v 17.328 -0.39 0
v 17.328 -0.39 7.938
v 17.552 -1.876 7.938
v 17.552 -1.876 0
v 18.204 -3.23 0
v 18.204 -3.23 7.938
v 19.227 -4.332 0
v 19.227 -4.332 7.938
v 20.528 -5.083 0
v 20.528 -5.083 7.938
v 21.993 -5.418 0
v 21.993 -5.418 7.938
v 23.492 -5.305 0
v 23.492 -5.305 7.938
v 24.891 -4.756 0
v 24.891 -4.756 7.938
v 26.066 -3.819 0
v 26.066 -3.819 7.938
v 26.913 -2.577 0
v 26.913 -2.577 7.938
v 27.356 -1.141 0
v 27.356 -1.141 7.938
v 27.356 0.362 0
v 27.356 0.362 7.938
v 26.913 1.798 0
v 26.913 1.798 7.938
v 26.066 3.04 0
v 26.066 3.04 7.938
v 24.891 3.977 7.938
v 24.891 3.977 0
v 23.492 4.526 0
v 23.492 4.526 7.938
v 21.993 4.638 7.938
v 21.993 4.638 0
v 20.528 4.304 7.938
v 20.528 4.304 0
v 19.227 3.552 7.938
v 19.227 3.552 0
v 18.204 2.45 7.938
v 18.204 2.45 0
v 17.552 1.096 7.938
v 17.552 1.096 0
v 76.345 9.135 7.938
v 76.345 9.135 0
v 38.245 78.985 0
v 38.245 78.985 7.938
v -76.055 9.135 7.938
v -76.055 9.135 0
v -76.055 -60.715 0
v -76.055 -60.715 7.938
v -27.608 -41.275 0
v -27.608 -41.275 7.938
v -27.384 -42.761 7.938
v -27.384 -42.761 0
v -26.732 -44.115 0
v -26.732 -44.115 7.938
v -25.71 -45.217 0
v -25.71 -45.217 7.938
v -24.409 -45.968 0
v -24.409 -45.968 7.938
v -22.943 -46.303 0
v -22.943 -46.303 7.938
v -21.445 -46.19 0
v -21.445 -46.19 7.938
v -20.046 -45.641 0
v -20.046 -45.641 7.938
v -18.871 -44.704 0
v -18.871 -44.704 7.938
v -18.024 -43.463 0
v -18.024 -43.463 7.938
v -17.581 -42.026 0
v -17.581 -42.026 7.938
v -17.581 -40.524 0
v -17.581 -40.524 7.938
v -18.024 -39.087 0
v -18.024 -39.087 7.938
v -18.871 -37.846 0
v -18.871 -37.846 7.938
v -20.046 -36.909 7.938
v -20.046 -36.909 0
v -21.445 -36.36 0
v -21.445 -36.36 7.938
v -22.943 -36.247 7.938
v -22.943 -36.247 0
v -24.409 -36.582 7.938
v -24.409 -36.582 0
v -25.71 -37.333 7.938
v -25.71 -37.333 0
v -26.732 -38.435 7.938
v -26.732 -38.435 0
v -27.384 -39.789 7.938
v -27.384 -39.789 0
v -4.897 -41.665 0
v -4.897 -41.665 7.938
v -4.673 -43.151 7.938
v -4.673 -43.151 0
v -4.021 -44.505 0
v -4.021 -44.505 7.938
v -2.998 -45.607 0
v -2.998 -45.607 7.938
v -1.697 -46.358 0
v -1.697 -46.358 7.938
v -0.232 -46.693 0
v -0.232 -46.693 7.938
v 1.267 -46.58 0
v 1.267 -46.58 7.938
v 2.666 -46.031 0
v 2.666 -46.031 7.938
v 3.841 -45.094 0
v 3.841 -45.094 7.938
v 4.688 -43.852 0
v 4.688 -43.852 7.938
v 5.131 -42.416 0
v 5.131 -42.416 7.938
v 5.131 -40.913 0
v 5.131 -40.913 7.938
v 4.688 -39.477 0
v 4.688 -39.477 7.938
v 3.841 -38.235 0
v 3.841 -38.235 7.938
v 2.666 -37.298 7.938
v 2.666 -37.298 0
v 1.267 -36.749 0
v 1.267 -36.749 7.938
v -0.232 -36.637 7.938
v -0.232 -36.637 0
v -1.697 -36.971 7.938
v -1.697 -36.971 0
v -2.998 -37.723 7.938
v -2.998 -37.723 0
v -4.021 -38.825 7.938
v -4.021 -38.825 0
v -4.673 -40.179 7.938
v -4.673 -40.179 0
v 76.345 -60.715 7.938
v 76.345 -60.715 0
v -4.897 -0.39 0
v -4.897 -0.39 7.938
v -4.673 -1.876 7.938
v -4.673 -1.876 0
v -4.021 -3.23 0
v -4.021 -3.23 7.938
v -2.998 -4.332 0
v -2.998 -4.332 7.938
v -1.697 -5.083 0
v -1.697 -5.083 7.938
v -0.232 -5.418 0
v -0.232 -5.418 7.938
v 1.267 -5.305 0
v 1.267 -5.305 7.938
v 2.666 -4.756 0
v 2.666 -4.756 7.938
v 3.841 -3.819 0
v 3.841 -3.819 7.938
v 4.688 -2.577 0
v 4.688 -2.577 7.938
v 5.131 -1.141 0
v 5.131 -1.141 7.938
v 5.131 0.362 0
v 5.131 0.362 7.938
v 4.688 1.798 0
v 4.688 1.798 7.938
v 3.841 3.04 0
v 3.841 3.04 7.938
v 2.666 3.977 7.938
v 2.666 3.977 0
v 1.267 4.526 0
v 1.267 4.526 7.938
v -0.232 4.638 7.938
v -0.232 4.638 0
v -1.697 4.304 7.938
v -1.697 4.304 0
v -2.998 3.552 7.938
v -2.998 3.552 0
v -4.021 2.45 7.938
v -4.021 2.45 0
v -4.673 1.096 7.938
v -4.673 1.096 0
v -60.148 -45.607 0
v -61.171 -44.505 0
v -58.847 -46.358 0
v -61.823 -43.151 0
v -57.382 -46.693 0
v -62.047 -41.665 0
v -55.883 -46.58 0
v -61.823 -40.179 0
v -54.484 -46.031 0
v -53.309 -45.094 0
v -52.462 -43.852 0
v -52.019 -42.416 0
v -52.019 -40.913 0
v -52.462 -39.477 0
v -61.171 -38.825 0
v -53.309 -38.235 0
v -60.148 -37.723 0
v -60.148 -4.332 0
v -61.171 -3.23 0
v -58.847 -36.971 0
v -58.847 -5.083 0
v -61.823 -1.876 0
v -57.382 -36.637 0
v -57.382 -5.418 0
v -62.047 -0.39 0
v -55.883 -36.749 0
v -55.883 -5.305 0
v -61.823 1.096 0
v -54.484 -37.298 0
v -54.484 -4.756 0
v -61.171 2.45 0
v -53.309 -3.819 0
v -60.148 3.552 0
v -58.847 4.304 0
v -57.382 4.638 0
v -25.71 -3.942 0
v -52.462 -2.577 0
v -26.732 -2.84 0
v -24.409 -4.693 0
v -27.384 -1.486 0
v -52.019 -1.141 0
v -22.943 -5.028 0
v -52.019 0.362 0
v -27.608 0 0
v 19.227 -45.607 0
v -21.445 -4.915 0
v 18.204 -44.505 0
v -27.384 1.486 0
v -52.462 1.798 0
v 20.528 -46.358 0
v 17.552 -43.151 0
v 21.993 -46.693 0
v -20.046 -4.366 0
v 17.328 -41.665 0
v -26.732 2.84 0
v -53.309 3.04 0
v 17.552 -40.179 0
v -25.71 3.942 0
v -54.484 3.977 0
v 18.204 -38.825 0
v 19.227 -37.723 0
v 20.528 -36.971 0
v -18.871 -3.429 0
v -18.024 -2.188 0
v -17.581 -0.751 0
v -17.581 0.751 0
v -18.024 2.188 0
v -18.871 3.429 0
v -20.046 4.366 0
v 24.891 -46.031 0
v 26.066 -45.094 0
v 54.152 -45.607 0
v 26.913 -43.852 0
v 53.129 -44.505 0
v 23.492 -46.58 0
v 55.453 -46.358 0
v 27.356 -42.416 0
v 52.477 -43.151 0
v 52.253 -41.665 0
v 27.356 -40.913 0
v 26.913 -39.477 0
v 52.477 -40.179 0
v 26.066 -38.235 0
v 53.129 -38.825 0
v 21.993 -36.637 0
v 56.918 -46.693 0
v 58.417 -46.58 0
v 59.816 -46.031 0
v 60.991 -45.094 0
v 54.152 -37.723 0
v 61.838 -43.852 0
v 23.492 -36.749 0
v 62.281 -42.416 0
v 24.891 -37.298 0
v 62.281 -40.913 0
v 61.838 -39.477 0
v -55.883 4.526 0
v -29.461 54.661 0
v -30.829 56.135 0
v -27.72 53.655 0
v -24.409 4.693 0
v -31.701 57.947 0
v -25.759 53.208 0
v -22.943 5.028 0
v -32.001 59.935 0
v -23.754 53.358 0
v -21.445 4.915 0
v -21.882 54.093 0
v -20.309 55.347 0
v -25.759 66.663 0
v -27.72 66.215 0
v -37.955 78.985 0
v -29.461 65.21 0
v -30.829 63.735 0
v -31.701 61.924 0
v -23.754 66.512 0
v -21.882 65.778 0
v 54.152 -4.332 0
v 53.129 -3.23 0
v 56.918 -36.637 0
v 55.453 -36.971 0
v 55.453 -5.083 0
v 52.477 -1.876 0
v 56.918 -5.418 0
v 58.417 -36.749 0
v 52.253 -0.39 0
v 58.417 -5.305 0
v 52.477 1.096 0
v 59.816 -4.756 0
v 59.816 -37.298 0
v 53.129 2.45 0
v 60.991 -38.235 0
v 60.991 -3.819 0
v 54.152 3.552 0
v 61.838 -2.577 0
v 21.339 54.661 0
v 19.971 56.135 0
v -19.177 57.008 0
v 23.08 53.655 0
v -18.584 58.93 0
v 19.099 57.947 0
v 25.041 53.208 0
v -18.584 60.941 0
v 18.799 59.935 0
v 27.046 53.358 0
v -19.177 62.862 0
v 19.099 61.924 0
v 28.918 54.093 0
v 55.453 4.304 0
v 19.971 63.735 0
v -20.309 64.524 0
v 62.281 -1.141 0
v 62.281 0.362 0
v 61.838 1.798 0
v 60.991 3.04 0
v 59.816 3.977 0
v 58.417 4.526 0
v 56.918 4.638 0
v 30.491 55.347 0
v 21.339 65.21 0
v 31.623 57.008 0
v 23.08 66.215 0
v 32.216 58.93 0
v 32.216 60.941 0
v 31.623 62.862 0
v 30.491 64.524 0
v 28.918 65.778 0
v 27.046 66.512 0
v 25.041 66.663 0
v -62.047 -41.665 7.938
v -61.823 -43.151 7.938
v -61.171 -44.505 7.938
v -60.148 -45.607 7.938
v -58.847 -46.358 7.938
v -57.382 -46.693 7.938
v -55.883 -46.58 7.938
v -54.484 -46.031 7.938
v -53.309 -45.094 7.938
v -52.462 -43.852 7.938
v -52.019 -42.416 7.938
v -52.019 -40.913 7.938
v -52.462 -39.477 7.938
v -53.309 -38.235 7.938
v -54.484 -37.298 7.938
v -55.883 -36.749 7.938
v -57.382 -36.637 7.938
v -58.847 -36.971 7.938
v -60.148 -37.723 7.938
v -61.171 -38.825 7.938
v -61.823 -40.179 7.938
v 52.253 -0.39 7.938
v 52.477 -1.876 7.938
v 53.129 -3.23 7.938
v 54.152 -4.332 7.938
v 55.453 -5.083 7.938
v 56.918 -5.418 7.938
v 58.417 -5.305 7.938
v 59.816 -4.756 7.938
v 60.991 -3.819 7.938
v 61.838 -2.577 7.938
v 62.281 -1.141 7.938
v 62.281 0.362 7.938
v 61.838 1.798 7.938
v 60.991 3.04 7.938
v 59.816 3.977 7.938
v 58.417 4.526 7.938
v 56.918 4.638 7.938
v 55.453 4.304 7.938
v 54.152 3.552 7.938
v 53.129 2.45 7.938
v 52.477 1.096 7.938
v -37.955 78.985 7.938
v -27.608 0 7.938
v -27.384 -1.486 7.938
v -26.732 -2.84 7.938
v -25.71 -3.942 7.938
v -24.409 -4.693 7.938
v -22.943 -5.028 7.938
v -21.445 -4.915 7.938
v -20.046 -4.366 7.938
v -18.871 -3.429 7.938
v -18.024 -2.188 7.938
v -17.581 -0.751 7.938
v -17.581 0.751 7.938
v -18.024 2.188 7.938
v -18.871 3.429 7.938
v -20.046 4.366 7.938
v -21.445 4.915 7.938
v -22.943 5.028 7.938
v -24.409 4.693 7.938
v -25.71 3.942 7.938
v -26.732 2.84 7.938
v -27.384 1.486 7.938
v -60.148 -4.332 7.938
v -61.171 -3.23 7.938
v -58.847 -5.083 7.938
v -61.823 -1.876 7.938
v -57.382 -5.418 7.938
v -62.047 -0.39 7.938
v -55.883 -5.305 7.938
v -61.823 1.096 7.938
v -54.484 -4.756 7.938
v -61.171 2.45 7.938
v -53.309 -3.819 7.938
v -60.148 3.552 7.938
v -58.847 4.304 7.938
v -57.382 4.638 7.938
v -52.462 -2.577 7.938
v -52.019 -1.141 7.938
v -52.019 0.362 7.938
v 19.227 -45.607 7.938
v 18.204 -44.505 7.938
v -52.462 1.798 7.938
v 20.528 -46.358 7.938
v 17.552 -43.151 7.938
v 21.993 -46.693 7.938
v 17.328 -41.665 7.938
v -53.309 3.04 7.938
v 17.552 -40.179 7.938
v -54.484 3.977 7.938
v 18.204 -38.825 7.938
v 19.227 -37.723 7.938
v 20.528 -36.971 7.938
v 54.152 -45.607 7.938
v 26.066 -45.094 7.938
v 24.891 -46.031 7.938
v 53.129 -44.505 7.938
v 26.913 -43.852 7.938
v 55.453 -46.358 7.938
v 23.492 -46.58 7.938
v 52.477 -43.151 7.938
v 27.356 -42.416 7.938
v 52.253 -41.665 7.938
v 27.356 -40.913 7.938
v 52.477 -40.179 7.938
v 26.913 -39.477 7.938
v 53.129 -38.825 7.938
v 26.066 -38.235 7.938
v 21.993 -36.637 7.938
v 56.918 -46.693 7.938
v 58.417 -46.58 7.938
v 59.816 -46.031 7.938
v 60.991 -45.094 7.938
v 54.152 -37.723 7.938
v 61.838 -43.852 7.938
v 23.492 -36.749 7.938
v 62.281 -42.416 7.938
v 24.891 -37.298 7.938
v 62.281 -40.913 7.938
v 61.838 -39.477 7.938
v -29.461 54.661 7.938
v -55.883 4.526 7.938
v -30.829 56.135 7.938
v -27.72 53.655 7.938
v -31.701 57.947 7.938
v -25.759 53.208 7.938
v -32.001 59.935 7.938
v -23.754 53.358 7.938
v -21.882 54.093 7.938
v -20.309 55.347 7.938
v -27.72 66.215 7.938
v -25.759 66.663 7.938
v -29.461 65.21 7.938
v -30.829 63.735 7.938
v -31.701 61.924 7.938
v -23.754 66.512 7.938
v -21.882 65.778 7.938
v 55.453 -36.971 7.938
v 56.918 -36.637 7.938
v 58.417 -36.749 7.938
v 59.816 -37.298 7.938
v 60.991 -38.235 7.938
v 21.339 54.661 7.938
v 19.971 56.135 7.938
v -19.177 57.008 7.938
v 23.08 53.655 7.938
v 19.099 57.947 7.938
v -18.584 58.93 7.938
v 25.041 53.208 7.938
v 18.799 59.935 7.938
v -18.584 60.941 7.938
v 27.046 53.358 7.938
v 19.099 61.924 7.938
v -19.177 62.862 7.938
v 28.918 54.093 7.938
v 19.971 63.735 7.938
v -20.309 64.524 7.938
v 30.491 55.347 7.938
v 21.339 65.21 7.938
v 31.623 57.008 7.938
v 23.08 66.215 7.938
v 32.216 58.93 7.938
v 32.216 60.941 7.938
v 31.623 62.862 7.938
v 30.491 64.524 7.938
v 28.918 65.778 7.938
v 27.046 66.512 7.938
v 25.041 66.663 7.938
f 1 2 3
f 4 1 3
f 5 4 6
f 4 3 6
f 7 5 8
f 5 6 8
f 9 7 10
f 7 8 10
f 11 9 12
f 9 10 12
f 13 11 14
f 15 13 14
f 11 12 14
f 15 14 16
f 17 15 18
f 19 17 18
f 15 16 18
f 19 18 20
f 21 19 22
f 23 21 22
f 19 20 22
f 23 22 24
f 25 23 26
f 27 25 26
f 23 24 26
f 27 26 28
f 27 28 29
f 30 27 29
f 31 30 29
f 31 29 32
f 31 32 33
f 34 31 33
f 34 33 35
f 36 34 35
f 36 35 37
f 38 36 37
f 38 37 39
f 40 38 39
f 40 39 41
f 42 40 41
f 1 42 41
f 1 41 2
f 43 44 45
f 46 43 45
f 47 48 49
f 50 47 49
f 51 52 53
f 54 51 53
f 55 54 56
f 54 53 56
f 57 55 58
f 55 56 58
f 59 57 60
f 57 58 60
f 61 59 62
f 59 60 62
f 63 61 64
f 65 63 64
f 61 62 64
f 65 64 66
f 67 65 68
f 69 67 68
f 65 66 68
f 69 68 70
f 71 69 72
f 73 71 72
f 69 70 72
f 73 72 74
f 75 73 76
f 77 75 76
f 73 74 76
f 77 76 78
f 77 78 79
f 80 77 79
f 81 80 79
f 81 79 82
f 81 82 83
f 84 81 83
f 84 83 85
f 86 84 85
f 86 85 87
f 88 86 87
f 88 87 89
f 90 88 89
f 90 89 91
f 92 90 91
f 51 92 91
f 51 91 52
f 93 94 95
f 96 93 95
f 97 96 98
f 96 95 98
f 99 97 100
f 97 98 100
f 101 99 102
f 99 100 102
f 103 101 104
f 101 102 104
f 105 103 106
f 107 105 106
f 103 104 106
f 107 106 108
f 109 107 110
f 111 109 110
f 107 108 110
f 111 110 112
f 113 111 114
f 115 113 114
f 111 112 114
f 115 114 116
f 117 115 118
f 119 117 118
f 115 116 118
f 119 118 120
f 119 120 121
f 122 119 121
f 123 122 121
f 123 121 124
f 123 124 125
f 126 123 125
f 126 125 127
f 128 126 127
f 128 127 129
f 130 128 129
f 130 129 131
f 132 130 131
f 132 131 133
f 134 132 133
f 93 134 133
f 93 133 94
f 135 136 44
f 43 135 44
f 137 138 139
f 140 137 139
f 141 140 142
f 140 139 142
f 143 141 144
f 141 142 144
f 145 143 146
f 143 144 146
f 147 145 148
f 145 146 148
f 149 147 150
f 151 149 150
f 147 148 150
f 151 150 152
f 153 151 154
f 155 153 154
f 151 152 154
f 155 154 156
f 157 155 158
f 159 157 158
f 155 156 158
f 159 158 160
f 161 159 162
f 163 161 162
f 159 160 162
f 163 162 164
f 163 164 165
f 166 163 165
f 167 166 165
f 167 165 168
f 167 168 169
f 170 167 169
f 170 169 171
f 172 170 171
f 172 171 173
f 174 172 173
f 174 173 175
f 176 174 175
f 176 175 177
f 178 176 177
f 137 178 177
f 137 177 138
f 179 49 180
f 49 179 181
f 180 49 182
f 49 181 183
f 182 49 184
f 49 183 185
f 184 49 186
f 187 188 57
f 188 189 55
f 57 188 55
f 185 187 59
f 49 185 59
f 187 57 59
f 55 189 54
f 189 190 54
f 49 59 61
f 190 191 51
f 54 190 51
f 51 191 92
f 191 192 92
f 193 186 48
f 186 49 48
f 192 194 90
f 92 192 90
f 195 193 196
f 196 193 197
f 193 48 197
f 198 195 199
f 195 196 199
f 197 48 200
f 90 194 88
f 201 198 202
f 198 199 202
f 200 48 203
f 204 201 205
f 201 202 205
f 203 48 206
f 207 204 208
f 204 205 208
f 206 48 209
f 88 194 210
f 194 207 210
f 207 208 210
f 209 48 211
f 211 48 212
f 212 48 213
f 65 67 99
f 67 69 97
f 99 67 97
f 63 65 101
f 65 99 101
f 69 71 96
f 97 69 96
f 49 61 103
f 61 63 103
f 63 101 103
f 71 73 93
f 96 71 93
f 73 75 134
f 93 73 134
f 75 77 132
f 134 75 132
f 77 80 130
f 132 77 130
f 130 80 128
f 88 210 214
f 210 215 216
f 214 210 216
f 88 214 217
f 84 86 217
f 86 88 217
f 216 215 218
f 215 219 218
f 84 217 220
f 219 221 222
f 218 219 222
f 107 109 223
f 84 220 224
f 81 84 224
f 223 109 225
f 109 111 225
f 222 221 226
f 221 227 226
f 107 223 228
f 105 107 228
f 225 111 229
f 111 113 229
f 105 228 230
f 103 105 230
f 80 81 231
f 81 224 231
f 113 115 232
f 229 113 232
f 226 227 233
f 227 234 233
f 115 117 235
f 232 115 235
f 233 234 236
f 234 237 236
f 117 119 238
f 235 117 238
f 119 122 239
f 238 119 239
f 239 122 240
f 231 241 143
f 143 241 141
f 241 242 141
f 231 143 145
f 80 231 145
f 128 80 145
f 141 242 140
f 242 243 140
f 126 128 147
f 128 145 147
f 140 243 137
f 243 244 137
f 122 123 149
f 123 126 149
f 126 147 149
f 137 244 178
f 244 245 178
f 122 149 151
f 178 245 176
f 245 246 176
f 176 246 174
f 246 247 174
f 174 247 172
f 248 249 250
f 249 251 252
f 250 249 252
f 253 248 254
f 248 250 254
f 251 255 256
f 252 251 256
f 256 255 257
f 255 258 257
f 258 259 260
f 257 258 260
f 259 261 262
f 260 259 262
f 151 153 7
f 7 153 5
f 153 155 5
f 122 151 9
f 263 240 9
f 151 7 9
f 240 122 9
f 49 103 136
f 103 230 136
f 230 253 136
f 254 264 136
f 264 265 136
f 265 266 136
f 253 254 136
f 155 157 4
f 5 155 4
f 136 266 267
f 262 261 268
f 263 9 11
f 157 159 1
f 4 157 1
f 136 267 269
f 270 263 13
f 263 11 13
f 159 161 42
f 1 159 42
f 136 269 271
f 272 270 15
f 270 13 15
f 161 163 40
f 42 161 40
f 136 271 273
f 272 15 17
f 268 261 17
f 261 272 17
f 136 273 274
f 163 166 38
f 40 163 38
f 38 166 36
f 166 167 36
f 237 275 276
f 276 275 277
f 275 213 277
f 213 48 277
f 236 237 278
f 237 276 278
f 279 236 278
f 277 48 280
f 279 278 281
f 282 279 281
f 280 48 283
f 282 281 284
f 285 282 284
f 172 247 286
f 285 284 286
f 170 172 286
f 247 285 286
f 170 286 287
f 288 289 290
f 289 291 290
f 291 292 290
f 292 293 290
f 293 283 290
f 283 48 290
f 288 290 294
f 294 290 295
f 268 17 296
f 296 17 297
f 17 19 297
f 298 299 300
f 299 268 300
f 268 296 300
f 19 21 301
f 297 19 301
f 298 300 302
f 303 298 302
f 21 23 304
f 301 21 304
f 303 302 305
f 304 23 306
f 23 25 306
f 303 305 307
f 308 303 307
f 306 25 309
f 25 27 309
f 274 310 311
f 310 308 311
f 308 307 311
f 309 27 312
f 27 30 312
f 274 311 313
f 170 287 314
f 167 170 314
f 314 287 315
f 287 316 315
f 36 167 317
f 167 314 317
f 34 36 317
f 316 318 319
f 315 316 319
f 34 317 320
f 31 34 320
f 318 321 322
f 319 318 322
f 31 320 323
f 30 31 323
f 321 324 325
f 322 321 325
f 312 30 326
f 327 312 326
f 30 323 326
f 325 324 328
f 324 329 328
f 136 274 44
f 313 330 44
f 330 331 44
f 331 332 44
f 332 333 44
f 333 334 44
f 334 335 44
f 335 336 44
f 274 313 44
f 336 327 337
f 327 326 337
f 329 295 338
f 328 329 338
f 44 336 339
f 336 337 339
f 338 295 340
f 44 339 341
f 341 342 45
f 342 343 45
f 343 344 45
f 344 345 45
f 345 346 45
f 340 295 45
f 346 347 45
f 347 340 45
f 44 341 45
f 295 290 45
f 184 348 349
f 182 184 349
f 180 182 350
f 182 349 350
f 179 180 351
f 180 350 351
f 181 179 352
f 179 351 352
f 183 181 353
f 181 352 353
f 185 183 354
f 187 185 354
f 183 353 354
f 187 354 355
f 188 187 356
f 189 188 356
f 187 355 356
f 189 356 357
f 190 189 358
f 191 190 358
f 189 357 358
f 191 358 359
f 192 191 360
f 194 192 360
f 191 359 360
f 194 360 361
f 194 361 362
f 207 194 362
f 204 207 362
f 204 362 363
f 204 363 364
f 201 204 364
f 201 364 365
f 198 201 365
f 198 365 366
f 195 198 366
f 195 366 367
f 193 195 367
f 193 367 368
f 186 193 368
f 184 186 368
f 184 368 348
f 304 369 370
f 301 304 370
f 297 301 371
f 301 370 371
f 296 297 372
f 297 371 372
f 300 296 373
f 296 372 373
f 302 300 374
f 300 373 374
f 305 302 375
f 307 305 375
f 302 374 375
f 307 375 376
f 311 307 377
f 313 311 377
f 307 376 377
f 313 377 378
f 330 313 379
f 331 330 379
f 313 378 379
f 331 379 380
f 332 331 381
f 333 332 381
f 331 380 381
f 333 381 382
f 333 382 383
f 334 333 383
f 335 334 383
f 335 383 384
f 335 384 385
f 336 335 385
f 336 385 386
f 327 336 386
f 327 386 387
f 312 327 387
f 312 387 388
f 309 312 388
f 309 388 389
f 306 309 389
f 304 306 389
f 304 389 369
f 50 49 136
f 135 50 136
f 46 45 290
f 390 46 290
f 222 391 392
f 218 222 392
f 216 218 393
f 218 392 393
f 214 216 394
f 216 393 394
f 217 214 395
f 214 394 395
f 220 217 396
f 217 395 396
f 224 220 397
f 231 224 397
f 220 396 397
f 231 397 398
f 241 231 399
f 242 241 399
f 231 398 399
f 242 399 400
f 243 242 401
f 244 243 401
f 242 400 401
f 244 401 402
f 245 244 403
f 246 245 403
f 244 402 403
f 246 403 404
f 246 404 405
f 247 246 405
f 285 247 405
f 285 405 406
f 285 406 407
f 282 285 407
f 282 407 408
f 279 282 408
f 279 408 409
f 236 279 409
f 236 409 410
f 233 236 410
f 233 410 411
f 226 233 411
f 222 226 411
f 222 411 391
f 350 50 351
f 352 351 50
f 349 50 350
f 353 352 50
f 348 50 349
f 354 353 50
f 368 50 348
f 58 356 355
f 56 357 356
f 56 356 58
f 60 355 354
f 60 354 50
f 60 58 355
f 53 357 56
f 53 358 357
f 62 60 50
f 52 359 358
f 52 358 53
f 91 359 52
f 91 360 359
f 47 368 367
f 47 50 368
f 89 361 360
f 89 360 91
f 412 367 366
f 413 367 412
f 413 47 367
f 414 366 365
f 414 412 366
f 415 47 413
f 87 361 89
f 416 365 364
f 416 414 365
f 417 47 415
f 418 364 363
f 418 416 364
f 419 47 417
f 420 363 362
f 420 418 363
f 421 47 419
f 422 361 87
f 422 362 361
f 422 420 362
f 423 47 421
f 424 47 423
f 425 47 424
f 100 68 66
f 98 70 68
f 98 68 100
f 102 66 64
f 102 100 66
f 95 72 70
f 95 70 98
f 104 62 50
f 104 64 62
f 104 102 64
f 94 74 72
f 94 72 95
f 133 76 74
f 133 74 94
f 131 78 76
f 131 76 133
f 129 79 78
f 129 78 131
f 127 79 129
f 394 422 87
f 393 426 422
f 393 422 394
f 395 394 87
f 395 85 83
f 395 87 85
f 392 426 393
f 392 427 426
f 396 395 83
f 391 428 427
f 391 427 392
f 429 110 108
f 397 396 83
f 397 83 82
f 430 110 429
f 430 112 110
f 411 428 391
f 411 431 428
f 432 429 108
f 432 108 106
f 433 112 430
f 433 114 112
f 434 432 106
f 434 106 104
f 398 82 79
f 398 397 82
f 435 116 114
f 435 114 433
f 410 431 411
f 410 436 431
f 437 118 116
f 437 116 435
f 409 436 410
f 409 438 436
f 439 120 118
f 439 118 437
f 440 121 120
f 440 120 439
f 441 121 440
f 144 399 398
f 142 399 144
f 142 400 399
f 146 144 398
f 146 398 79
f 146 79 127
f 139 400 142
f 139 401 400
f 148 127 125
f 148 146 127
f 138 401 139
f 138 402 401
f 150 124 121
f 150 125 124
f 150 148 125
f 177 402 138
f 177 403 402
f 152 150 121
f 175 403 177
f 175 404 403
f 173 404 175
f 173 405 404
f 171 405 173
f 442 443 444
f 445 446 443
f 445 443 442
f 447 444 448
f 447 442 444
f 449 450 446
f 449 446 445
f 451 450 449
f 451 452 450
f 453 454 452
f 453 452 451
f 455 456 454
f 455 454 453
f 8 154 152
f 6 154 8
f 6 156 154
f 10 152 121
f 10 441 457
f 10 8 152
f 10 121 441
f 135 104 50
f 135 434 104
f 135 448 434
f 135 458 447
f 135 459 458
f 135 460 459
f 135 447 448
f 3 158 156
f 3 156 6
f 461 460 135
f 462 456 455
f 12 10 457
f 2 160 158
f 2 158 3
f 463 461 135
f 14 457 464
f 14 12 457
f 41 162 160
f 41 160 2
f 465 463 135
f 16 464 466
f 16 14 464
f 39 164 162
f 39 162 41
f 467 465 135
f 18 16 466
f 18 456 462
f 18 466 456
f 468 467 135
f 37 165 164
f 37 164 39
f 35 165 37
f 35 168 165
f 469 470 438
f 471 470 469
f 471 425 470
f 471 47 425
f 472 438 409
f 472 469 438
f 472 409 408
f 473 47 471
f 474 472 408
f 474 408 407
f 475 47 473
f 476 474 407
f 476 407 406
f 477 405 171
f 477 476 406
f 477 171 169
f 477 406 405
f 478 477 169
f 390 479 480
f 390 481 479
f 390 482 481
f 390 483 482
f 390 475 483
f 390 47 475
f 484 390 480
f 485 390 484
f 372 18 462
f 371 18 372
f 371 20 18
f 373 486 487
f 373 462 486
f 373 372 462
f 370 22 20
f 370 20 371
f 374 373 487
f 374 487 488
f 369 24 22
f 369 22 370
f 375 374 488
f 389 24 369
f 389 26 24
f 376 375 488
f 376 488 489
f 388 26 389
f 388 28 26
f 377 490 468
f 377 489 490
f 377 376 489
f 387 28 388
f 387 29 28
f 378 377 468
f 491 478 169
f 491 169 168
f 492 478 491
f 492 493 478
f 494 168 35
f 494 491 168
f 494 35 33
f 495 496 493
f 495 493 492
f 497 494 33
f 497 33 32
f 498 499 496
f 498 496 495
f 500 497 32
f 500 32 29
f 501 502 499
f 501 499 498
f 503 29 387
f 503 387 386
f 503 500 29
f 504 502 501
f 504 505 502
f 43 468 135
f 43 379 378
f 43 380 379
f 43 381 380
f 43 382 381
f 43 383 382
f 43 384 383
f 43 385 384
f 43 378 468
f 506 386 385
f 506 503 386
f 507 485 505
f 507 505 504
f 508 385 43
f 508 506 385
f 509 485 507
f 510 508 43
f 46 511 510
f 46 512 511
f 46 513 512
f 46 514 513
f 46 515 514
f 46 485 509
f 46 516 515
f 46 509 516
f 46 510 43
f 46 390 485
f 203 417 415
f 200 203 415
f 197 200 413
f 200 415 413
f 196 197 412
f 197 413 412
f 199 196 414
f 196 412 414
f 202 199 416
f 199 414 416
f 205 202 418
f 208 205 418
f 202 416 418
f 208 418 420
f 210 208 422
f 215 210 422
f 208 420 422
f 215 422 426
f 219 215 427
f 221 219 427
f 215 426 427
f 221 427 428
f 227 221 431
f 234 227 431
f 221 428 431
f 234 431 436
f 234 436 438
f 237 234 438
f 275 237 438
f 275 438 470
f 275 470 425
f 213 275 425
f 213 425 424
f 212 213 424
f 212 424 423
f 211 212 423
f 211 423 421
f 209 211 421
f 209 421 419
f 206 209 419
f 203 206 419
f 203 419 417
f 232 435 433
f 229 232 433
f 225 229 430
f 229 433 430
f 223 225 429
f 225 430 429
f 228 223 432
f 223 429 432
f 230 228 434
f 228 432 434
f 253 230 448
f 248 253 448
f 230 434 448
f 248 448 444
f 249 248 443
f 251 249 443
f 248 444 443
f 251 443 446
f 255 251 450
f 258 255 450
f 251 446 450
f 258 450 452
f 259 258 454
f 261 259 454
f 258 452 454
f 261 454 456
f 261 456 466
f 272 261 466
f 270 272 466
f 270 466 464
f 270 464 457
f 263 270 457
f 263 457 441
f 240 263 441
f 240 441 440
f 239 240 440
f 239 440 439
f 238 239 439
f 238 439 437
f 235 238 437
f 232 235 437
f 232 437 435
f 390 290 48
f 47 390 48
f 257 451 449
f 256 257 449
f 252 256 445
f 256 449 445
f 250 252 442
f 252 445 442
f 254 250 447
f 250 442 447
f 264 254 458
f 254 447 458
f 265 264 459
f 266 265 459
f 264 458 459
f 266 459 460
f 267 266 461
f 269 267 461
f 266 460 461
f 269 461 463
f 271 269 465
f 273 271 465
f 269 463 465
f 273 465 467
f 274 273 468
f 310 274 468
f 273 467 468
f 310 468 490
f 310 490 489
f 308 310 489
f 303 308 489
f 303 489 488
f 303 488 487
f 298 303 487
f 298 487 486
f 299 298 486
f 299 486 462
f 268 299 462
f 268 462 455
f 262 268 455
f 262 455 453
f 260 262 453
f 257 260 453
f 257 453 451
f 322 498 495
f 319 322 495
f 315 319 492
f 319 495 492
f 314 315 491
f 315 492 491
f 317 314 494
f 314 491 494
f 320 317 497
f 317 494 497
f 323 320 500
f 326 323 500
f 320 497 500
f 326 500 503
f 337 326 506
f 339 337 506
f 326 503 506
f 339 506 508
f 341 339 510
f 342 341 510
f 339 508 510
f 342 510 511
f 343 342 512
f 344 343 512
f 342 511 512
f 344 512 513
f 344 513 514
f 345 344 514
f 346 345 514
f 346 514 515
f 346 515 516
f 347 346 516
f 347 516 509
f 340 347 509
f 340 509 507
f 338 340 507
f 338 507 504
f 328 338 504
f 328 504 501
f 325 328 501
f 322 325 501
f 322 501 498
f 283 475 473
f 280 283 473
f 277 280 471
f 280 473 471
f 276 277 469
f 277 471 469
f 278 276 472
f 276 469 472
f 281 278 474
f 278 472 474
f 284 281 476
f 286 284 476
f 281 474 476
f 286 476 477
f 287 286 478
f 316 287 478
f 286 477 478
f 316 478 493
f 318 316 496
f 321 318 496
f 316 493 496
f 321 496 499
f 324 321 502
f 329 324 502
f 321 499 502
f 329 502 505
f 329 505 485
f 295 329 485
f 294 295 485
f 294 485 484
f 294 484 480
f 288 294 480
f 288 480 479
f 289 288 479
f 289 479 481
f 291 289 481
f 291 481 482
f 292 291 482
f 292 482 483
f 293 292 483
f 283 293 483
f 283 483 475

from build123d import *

# Parameters (mm, degrees)
F0_W     = 19.05
F0_H     = 19.05
F0_W_2   = 12.7
F1_DEPTH = 7.9375
F2_D     = 10.0838
F3_D     = 13.49248


# Not quite as in the source:
# - a feature names something its author has since deleted; it is built from what else it names


with BuildPart() as f1:
    # F0 (on Top) → F1 (new body)
    with BuildSketch(Plane.XY):
        with Locations((-66.5298237595, -51.1898304701)):
            Rectangle(F0_W, F0_H)
        Polygon((-57.0048237595, -41.6648304701), (-57.0048237595, -60.7148304701), (-37.9548237595, -60.7148304701), (-37.9548237595, 9.1351695299), (-76.0548237595, 9.1351695299), (-76.0548237595, -41.6648304701), align=None)
        Polygon((-37.9548237595, 9.1351695299), (-37.9548237595, -60.7148304701), (0.1451762405, -60.7148304701), (0.1451762405, -41.6648304701), (0.1451762405, -0.3898304701), (22.3701762405, -0.3898304701), (22.3701762405, -41.6648304701), (22.3701762405, -60.7148304701), (38.2451762405, -60.7148304701), (38.2451762405, 9.1351695299), align=None)
        Polygon((-37.9548237595, 78.9851695299), (-76.0548237595, 9.1351695299), (-37.9548237595, 9.1351695299), (-37.9548237595, 59.9351695299), align=None)
        Polygon((0.1451762405, -41.6648304701), (0.1451762405, -60.7148304701), (22.3701762405, -60.7148304701), (22.3701762405, -41.6648304701), (22.3701762405, -0.3898304701), (0.1451762405, -0.3898304701), align=None)
        Polygon((-37.9548237595, 59.9351695299), (-37.9548237595, 9.1351695299), (38.2451762405, 9.1351695299), (38.2451762405, 59.9351695299), (25.5451762405, 59.9351695299), (25.5451762405, 78.9851695299), (-25.2548237595, 78.9851695299), (-25.2548237595, 59.9351695299), align=None)
        with Locations((-31.6048237595, 69.4601695299)):
            Rectangle(F0_W_2, F0_H)
        Polygon((38.2451762405, 59.9351695299), (38.2451762405, 9.1351695299), (76.3451762405, 9.1351695299), (38.2451762405, 78.9851695299), align=None)
        Polygon((76.3451762405, 9.1351695299), (38.2451762405, 9.1351695299), (38.2451762405, -60.7148304701), (57.2951762405, -60.7148304701), (76.3451762405, -60.7148304701), align=None)
        with Locations((31.8951762405, 69.4601695299)):
            Rectangle(F0_W_2, F0_H)
    extrude(amount=F1_DEPTH)

    # F2 (through all)
    with Locations(Plane(origin=(0, 0, 0), x_dir=(1, 0, 0), z_dir=(0, 0, -1))):
        with Locations((-57.0048237595, 0.3898304701), (-57.0048237595, 41.6648304701), (0.1451762405, 0.3898304701), (0.1451762405, 41.6648304701), (57.2951762405, 0.3898304701), (57.2951762405, 41.6648304701), (-22.5665104002, 0), (-22.5665104002, 41.275), (22.3701762405, 41.6648304701), (22.3701762405, 0.3898304701)):
            Hole(F2_D / 2)

    # F3 (through all)
    with Locations(Plane(origin=(0, 0, 0), x_dir=(1, 0, 0), z_dir=(0, 0, -1))):
        with Locations((-25.2548237595, -59.9351695299), (25.5451762405, -59.9351695299)):
            Hole(F3_D / 2)


solid = f1.part
